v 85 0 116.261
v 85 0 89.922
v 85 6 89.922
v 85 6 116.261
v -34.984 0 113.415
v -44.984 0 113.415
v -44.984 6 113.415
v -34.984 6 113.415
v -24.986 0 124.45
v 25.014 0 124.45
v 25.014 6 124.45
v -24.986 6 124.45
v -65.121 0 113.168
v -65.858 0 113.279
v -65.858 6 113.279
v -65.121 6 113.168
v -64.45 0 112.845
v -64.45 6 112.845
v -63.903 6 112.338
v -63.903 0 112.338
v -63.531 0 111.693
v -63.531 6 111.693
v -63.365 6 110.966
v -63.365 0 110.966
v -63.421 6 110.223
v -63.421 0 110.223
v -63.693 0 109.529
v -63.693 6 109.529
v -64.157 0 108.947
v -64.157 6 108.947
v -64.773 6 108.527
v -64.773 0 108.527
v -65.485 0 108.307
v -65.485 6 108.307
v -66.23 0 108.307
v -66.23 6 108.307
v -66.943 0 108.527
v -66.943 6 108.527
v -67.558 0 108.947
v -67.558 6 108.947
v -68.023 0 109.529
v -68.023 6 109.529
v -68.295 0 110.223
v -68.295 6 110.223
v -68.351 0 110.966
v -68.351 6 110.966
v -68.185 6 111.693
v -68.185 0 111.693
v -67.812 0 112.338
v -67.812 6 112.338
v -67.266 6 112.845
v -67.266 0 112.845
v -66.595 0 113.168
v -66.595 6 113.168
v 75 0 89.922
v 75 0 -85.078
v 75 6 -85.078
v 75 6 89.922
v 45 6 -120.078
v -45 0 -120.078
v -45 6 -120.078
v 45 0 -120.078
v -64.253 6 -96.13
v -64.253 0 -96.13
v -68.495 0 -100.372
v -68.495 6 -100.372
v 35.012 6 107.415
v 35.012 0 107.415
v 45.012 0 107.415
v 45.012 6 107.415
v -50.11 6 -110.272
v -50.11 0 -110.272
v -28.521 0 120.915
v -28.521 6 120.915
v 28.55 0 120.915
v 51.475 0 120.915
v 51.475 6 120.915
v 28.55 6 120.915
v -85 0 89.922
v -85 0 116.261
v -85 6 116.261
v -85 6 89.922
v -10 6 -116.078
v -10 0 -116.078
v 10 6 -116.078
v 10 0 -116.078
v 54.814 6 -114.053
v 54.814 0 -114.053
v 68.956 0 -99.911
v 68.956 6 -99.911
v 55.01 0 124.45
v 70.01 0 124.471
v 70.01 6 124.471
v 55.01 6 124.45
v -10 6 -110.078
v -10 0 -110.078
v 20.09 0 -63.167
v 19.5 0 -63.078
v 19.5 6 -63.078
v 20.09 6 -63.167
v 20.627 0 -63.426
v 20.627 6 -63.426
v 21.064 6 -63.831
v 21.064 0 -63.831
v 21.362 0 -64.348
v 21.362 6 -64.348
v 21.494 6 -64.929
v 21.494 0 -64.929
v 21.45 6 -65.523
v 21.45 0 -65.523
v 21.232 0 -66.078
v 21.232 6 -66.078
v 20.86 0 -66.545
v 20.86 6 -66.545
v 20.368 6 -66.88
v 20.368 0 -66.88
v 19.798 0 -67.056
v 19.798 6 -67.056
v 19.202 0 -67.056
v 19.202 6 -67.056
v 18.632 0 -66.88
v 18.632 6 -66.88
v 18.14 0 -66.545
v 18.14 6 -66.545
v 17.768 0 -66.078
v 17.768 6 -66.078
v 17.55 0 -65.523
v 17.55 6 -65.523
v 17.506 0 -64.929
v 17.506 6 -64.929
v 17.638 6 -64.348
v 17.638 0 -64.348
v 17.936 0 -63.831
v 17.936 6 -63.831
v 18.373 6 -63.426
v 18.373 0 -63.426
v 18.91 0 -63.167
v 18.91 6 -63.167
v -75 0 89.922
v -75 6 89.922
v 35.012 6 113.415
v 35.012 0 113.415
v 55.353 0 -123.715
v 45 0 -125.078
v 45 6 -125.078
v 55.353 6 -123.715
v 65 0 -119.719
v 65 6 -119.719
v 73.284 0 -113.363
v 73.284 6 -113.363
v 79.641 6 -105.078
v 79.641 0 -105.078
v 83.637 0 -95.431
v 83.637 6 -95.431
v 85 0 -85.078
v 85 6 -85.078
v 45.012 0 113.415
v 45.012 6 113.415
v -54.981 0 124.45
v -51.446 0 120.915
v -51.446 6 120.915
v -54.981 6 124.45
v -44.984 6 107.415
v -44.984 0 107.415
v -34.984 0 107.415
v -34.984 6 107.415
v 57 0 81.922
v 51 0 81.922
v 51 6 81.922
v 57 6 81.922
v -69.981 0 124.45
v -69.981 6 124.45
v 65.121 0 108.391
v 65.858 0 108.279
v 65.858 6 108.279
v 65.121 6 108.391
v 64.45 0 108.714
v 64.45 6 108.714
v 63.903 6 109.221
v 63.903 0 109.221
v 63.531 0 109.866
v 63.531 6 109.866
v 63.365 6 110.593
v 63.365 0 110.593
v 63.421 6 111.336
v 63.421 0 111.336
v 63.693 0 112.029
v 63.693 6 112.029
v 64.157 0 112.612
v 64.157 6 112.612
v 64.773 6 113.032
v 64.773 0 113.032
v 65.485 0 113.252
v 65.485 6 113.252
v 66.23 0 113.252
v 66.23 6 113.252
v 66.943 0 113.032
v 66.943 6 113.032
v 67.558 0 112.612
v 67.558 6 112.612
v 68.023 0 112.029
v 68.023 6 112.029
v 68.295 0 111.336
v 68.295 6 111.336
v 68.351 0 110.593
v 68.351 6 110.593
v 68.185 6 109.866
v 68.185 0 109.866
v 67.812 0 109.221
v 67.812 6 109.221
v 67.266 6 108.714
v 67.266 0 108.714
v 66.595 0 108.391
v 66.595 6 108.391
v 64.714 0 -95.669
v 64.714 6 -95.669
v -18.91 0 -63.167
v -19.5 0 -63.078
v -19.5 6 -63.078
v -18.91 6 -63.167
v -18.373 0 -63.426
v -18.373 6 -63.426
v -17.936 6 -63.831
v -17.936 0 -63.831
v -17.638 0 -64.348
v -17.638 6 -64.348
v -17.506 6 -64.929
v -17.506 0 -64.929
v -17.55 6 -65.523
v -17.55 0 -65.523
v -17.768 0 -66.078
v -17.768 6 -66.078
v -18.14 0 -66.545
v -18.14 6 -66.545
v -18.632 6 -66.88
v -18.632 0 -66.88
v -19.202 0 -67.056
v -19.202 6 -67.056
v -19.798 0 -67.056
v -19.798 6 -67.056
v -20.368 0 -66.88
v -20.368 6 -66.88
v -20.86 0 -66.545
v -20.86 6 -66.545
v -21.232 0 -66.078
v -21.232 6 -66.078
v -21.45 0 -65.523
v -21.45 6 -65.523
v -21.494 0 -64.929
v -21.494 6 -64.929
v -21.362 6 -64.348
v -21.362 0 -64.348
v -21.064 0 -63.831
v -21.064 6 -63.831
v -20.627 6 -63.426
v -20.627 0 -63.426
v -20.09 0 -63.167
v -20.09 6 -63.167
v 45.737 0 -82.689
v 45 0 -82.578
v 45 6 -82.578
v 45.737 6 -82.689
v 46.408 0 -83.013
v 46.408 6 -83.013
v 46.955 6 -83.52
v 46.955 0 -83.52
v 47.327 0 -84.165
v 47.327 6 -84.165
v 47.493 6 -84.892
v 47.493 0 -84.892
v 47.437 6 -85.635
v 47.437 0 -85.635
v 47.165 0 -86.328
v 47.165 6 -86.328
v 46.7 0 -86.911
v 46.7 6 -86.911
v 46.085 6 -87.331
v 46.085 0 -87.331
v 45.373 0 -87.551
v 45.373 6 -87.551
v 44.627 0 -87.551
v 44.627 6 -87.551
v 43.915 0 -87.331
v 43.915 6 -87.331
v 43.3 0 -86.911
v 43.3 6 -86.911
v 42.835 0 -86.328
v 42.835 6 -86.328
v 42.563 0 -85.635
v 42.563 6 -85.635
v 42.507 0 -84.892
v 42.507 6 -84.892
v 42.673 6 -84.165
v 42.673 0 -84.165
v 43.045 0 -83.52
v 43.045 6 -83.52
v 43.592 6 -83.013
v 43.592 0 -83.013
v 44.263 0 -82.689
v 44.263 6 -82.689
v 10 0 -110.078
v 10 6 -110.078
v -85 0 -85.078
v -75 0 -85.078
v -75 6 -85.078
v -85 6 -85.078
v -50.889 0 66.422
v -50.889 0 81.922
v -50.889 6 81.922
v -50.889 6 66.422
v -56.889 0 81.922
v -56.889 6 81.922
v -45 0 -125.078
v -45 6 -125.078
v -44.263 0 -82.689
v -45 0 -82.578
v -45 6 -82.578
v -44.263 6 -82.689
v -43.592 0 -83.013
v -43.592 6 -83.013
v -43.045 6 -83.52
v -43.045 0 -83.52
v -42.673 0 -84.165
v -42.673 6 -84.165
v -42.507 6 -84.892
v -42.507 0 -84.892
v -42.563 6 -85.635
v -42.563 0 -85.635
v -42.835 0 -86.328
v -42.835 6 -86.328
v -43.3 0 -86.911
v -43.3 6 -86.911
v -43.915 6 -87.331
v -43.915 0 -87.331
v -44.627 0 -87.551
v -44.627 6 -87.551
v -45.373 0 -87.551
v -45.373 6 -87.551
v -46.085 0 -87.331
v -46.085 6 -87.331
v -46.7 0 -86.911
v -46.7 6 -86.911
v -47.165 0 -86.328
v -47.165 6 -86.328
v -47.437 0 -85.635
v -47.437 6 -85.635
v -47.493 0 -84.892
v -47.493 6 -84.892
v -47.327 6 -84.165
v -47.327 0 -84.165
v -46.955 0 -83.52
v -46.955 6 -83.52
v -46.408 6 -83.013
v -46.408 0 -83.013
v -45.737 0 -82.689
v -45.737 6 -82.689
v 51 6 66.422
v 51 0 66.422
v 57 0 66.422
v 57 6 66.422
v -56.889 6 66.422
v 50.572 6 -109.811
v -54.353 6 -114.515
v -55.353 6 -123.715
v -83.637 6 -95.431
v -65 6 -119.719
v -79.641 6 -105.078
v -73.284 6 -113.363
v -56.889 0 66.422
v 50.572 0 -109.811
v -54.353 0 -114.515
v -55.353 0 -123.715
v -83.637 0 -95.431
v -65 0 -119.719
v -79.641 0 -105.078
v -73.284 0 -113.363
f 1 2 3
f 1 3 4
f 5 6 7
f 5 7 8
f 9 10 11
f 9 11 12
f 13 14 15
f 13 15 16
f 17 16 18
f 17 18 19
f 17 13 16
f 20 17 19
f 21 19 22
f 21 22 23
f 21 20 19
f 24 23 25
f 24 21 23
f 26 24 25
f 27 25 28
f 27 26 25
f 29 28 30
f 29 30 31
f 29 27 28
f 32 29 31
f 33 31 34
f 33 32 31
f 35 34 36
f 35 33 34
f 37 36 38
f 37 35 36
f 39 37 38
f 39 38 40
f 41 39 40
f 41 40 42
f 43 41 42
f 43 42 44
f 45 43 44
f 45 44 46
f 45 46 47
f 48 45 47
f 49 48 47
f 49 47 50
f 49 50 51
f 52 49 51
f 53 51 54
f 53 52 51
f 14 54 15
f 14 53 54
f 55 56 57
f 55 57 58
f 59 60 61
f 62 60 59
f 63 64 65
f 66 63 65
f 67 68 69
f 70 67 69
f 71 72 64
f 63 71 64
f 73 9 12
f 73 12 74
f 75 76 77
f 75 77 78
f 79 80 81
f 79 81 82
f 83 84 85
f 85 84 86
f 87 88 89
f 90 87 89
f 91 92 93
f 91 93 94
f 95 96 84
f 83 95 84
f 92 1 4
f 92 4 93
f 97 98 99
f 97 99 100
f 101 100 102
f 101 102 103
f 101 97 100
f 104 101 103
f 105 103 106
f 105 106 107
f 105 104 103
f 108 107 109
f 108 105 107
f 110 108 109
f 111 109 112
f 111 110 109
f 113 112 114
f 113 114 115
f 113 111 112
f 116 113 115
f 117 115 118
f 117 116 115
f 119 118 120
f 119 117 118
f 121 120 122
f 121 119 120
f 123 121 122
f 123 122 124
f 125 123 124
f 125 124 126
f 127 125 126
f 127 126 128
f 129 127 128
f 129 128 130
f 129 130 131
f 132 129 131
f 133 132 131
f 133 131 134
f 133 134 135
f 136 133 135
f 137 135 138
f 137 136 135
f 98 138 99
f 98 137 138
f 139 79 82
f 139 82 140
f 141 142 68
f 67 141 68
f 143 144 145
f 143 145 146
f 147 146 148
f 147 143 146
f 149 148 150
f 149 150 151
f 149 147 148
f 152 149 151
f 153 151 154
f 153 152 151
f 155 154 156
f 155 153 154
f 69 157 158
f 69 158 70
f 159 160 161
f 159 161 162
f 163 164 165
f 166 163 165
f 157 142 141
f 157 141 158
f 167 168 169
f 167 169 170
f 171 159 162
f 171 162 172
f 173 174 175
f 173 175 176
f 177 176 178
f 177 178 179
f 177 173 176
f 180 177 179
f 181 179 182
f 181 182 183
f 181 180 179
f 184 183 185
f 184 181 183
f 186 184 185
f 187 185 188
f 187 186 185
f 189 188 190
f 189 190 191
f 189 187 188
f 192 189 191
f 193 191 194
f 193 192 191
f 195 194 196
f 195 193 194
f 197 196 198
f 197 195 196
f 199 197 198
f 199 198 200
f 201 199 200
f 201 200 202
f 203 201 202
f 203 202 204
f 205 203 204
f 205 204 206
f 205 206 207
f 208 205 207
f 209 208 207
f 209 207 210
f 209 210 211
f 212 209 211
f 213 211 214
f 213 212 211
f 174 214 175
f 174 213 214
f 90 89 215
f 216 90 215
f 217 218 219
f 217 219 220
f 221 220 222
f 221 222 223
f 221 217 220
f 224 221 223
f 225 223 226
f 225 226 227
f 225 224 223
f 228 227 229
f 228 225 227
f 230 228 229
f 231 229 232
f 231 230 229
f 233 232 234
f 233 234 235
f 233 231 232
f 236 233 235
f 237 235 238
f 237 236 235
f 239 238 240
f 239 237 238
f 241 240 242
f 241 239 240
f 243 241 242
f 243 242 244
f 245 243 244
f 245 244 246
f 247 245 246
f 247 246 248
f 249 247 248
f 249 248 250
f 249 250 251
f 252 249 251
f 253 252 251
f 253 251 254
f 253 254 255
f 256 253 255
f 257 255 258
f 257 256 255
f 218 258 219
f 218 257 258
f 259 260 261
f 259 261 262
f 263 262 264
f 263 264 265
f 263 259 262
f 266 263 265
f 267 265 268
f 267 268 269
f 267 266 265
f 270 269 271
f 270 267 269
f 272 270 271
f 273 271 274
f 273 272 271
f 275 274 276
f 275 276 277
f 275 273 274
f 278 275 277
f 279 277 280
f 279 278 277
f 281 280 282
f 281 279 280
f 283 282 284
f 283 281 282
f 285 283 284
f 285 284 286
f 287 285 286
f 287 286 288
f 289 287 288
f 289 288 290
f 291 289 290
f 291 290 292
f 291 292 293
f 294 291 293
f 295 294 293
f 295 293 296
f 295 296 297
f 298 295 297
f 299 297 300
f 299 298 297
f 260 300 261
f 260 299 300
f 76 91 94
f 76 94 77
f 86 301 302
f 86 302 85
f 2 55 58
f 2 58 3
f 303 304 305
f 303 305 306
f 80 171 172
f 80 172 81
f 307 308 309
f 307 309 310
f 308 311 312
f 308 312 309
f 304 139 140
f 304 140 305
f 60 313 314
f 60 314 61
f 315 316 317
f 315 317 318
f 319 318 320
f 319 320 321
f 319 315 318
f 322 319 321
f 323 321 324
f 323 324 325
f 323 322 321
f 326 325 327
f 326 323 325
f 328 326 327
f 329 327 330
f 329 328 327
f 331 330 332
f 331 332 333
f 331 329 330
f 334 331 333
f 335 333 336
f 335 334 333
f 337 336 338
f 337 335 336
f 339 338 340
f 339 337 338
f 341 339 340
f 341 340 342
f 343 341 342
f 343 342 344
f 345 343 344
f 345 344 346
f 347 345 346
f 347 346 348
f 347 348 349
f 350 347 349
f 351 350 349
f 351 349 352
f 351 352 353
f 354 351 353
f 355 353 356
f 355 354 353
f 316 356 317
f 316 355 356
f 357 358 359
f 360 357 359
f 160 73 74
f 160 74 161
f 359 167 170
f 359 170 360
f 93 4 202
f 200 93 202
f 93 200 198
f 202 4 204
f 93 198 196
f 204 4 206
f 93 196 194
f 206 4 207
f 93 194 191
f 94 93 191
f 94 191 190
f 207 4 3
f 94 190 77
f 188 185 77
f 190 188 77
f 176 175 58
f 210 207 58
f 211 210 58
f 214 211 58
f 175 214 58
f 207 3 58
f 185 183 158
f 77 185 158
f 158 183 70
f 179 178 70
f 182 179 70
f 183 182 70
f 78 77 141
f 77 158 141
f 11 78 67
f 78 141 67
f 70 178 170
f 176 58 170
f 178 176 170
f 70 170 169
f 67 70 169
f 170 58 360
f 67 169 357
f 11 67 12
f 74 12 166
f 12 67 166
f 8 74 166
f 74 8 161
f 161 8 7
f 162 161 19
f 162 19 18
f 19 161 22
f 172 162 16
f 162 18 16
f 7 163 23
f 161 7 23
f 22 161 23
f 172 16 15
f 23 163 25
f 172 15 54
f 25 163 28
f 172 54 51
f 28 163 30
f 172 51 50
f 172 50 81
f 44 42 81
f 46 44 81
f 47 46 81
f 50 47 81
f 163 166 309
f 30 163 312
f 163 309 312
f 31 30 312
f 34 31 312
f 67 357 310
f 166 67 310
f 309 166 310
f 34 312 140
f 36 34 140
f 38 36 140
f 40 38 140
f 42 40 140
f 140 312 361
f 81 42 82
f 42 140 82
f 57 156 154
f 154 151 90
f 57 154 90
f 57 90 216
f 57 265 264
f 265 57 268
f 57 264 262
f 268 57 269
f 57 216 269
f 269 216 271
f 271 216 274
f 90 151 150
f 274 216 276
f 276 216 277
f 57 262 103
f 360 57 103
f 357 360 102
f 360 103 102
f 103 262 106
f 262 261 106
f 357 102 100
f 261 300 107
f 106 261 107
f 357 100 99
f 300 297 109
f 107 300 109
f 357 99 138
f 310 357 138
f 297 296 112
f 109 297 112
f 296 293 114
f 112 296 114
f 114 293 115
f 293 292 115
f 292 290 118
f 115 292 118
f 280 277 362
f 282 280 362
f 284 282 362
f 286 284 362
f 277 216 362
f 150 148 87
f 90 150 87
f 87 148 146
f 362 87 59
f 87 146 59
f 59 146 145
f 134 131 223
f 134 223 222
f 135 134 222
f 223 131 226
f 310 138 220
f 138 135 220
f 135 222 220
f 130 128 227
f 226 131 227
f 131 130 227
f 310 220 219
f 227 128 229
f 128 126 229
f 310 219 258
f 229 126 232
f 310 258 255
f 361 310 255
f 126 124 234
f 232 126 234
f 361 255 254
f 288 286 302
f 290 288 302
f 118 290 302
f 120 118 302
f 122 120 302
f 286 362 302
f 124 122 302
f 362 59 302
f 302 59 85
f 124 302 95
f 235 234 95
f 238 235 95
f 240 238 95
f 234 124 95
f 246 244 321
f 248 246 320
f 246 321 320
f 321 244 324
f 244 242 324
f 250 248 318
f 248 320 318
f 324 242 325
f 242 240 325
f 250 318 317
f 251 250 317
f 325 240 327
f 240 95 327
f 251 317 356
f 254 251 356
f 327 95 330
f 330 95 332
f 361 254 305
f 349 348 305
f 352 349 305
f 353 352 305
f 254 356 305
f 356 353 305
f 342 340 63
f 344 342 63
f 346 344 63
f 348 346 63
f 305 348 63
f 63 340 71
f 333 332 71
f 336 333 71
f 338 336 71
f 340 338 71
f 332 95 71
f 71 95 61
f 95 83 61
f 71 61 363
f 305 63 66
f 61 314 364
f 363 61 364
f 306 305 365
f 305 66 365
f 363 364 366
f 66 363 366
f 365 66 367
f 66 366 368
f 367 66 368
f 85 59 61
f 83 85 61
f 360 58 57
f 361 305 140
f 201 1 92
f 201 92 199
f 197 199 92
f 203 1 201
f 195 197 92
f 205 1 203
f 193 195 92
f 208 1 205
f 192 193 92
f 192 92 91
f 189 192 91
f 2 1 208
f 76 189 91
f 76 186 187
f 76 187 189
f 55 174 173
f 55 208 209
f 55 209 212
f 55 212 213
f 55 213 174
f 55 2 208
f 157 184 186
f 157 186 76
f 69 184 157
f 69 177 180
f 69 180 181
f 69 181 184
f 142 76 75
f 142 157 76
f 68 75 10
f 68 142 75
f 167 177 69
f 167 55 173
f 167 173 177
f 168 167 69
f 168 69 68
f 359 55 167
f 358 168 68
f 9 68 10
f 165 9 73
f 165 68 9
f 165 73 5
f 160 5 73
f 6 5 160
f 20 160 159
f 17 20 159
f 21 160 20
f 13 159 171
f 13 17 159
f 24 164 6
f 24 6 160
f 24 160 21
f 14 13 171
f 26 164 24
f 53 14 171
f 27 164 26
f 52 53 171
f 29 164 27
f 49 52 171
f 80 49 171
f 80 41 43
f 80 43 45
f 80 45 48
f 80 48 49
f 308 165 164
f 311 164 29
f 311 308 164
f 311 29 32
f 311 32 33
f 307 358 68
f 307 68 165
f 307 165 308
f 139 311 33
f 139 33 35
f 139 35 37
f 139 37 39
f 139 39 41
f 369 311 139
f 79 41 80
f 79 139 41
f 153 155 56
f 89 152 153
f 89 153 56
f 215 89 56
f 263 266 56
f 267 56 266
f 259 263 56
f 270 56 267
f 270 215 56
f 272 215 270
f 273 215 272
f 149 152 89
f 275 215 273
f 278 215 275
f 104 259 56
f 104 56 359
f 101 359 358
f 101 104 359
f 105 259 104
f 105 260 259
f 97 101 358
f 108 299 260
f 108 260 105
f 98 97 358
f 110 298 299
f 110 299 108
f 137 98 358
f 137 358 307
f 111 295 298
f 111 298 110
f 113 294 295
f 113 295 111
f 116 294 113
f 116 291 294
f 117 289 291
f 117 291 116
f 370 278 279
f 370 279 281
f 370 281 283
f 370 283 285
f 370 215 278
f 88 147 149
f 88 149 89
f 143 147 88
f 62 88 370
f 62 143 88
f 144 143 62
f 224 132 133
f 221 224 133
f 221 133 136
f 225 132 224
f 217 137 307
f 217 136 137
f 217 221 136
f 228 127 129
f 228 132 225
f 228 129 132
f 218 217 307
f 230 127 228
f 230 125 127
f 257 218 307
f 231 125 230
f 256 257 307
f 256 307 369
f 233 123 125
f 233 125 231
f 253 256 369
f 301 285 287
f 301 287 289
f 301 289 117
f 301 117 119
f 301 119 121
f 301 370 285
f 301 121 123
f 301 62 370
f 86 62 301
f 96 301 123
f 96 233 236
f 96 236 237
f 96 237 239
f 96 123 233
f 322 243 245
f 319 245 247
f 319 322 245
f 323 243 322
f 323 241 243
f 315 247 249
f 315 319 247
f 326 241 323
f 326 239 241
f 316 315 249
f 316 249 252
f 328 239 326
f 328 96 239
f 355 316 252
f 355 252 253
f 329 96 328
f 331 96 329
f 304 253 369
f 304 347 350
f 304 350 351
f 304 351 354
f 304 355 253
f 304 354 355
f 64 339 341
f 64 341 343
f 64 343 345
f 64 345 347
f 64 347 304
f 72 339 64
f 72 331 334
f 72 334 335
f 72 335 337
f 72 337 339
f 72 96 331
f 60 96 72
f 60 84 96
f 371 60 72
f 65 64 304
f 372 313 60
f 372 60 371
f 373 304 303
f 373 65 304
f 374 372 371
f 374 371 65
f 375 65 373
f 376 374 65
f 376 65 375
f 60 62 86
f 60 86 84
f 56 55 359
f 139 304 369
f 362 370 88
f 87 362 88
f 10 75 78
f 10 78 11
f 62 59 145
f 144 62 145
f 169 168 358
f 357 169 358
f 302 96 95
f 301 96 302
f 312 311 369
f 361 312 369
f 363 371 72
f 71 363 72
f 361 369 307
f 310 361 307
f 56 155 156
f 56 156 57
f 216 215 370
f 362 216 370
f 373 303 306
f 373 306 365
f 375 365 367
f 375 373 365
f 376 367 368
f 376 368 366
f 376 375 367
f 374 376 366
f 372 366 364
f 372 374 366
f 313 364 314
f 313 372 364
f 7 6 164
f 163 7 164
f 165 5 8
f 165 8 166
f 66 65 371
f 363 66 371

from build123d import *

# Parameters (mm, degrees)
SKETCH1_R           = 2.5
SKETCH1_R_2         = 2
SKETCH1_W           = 20
SKETCH1_H           = 6
SKETCH1_W_2         = 10
SKETCH1_W_3         = 6
SKETCH1_H_2         = 15.5
BOSS_EXTRUDE1_DEPTH = 6


with BuildPart() as part:
    # Sketch1 → Boss-Extrude1 (new body)
    with BuildSketch(Plane(origin=(0, 0, 0), x_dir=(1, 0, 0), z_dir=(0, 1, 0))):
        with BuildLine():
            Line((-45, 125.078427477), (-45, 120.078427477))
            Line((-45, 120.078427477), (45, 120.078427477))
            Line((45, 120.078427477), (45, 125.078427477))
            ThreePointArc((45, 125.078427477), (73.284271247, 113.362698724), (85, 85.078427477))
            Line((85, 85.078427477), (75, 85.078427477))
            Line((75, 85.078427477), (75, -89.921572523))
            Line((75, -89.921572523), (85, -89.921572523))
            Line((85, -89.921572523), (85, -116.261318485))
            Line((85, -116.261318485), (70.010138709, -124.471382126))
            Line((70.010138709, -124.471382126), (55.010138709, -124.450192088))
            Line((55.010138709, -124.450192088), (51.474604803, -120.914658182))
            Line((51.474604803, -120.914658182), (28.549864753, -120.914658182))
            Line((28.549864753, -120.914658182), (25.014330847, -124.450192088))
            Line((25.014330847, -124.450192088), (-24.985669153, -124.450192088))
            Line((-24.985669153, -124.450192088), (-28.521203059, -120.914658182))
            Line((-28.521203059, -120.914658182), (-51.44594311, -120.914658182))
            Line((-51.44594311, -120.914658182), (-54.981477016, -124.450192088))
            Line((-54.981477016, -124.450192088), (-69.981477016, -124.450192088))
            Line((-69.981477016, -124.450192088), (-85, -116.261318485))
            Line((-85, -116.261318485), (-85, -89.921572523))
            Line((-85, -89.921572523), (-75, -89.921572523))
            Line((-75, -89.921572523), (-75, 85.078427477))
            Line((-75, 85.078427477), (-85, 85.078427477))
            ThreePointArc((-85, 85.078427477), (-73.284271247, 113.362698724), (-45, 125.078427477))
        make_face()
        with Locations(Location((-45, 85.078427477, 0), (0, 0, 270))):
            Circle(SKETCH1_R, mode=Mode.SUBTRACT)
        with Locations(Location((45, 85.078427477, 0), (0, 0, 270))):
            Circle(SKETCH1_R, mode=Mode.SUBTRACT)
        with Locations(Location((-65.857864376, -110.779436899, 0), (0, 0, 270))):
            Circle(SKETCH1_R, mode=Mode.SUBTRACT)
        with Locations(Location((65.857864376, -110.779436899, 0), (0, 0, 90))):
            Circle(SKETCH1_R, mode=Mode.SUBTRACT)
        with Locations(Location((19.5, 65.078427477, 0), (0, 0, 270))):
            Circle(SKETCH1_R_2, mode=Mode.SUBTRACT)
        with Locations(Location((-19.5, 65.078427477, 0), (0, 0, 270))):
            Circle(SKETCH1_R_2, mode=Mode.SUBTRACT)
        Polygon((50.571600169, 109.810660524), (54.814240856, 114.053301211), (68.95637648, 99.911165587), (64.713735792, 95.6685249), align=None, mode=Mode.SUBTRACT)
        with Locations((0, 113.078427477)):
            Rectangle(SKETCH1_W, SKETCH1_H, mode=Mode.SUBTRACT)
        Polygon((-50.11039508, 110.271865613), (-64.252530704, 96.129729989), (-68.495171391, 100.372370676), (-54.353035767, 114.5145063), align=None, mode=Mode.SUBTRACT)
        with Locations((-39.983573085, -110.414658182)):
            Rectangle(SKETCH1_W_2, SKETCH1_H, mode=Mode.SUBTRACT)
        with Locations((40.012234778, -110.414658182)):
            Rectangle(SKETCH1_W_2, SKETCH1_H, mode=Mode.SUBTRACT)
        with Locations((54, -74.171572523)):
            Rectangle(SKETCH1_W_3, SKETCH1_H_2, mode=Mode.SUBTRACT)
        with Locations((-53.888870578, -74.171572523)):
            Rectangle(SKETCH1_W_3, SKETCH1_H_2, mode=Mode.SUBTRACT)
    extrude(amount=BOSS_EXTRUDE1_DEPTH)


solid = part.part
